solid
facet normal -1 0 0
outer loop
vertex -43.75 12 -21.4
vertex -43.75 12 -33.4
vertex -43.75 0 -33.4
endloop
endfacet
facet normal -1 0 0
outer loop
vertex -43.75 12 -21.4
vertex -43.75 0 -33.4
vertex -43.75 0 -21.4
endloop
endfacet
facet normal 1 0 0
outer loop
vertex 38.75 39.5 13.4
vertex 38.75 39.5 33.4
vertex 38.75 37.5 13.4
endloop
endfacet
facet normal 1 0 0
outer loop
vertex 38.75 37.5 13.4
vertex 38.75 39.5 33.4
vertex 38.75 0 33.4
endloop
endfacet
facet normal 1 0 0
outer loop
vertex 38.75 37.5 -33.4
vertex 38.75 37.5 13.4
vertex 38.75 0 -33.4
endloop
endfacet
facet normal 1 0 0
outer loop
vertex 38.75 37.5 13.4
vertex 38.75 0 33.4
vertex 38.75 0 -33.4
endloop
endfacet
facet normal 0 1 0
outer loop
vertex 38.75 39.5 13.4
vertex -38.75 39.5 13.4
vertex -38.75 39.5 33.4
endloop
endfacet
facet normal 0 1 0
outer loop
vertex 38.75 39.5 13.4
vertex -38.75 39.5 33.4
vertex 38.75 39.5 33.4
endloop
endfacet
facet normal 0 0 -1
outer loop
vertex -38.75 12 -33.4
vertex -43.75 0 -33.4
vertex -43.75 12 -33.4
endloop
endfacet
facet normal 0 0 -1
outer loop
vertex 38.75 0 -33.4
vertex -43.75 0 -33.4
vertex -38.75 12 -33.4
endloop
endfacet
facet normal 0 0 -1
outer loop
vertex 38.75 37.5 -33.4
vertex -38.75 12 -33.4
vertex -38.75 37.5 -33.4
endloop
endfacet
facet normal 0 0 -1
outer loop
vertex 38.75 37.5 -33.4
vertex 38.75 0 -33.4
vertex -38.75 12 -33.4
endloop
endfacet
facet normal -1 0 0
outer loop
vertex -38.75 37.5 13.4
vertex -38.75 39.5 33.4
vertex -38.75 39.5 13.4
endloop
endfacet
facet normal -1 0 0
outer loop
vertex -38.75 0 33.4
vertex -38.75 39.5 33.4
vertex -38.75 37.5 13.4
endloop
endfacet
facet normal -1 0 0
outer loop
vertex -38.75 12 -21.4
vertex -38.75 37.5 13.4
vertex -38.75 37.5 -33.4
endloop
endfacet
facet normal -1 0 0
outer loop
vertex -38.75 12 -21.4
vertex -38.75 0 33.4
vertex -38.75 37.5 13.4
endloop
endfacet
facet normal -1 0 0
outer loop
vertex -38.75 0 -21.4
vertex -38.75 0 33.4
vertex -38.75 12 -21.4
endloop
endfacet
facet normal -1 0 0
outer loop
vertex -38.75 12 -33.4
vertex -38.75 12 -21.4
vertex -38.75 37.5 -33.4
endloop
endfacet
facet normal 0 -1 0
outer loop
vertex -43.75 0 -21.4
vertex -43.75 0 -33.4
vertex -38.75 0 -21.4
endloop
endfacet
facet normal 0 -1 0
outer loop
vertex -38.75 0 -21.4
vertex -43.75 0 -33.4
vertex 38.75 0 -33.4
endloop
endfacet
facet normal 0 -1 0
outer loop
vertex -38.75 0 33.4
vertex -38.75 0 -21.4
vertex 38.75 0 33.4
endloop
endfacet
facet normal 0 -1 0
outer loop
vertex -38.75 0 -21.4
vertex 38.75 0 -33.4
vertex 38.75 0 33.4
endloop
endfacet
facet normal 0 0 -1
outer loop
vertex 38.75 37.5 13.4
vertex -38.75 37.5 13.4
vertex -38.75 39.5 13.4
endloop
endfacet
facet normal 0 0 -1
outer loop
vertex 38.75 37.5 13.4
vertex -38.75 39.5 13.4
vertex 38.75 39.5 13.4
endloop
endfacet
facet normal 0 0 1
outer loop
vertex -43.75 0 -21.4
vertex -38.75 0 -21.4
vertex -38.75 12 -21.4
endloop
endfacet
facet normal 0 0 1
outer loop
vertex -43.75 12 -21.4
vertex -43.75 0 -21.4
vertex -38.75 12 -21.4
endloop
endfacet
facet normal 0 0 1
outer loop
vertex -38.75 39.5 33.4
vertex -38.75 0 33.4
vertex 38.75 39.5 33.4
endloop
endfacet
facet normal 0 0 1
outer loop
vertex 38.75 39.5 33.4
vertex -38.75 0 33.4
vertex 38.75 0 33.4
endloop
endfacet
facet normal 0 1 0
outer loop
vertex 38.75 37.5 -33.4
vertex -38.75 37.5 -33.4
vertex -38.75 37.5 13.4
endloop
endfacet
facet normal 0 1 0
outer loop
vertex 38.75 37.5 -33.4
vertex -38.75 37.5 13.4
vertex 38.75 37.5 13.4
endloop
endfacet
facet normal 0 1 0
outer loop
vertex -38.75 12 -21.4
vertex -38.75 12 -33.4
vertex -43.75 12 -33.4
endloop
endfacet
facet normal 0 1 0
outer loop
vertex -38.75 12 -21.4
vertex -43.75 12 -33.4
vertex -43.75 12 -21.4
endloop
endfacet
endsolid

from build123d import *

# Parameters (mm, degrees)
SKETCH1_W           = 77.5
SKETCH1_H           = 66.8
BOSS_EXTRUDE1_DEPTH = 37.5
SKETCH3_W           = 77.5
SKETCH3_H           = 20
BOSS_EXTRUDE2_DEPTH = 2
SKETCH4_W           = 12
SKETCH4_H           = 12
BOSS_EXTRUDE3_DEPTH = 5


with BuildPart() as part:
    # Sketch1 → Boss-Extrude1 (new body)
    with BuildSketch(Plane(origin=(0, 0, 0), x_dir=(1, 0, 0), z_dir=(0, 1, 0))):
        Rectangle(SKETCH1_W, SKETCH1_H)
    extrude(amount=BOSS_EXTRUDE1_DEPTH)

    # Sketch3 → Boss-Extrude2 (add)
    with BuildSketch(Plane(origin=(0, 37.5, 0), x_dir=(1, 0, 0), z_dir=(0, 1, 0))):
        with Locations((0, -23.4)):
            Rectangle(SKETCH3_W, SKETCH3_H)
    extrude(amount=BOSS_EXTRUDE2_DEPTH)

    # Sketch4 → Boss-Extrude3 (add)
    with BuildSketch(Plane.ZY.offset(38.75)):
        with Locations((-27.4, 6)):
            Rectangle(SKETCH4_W, SKETCH4_H)
    extrude(amount=BOSS_EXTRUDE3_DEPTH)


solid = part.part
